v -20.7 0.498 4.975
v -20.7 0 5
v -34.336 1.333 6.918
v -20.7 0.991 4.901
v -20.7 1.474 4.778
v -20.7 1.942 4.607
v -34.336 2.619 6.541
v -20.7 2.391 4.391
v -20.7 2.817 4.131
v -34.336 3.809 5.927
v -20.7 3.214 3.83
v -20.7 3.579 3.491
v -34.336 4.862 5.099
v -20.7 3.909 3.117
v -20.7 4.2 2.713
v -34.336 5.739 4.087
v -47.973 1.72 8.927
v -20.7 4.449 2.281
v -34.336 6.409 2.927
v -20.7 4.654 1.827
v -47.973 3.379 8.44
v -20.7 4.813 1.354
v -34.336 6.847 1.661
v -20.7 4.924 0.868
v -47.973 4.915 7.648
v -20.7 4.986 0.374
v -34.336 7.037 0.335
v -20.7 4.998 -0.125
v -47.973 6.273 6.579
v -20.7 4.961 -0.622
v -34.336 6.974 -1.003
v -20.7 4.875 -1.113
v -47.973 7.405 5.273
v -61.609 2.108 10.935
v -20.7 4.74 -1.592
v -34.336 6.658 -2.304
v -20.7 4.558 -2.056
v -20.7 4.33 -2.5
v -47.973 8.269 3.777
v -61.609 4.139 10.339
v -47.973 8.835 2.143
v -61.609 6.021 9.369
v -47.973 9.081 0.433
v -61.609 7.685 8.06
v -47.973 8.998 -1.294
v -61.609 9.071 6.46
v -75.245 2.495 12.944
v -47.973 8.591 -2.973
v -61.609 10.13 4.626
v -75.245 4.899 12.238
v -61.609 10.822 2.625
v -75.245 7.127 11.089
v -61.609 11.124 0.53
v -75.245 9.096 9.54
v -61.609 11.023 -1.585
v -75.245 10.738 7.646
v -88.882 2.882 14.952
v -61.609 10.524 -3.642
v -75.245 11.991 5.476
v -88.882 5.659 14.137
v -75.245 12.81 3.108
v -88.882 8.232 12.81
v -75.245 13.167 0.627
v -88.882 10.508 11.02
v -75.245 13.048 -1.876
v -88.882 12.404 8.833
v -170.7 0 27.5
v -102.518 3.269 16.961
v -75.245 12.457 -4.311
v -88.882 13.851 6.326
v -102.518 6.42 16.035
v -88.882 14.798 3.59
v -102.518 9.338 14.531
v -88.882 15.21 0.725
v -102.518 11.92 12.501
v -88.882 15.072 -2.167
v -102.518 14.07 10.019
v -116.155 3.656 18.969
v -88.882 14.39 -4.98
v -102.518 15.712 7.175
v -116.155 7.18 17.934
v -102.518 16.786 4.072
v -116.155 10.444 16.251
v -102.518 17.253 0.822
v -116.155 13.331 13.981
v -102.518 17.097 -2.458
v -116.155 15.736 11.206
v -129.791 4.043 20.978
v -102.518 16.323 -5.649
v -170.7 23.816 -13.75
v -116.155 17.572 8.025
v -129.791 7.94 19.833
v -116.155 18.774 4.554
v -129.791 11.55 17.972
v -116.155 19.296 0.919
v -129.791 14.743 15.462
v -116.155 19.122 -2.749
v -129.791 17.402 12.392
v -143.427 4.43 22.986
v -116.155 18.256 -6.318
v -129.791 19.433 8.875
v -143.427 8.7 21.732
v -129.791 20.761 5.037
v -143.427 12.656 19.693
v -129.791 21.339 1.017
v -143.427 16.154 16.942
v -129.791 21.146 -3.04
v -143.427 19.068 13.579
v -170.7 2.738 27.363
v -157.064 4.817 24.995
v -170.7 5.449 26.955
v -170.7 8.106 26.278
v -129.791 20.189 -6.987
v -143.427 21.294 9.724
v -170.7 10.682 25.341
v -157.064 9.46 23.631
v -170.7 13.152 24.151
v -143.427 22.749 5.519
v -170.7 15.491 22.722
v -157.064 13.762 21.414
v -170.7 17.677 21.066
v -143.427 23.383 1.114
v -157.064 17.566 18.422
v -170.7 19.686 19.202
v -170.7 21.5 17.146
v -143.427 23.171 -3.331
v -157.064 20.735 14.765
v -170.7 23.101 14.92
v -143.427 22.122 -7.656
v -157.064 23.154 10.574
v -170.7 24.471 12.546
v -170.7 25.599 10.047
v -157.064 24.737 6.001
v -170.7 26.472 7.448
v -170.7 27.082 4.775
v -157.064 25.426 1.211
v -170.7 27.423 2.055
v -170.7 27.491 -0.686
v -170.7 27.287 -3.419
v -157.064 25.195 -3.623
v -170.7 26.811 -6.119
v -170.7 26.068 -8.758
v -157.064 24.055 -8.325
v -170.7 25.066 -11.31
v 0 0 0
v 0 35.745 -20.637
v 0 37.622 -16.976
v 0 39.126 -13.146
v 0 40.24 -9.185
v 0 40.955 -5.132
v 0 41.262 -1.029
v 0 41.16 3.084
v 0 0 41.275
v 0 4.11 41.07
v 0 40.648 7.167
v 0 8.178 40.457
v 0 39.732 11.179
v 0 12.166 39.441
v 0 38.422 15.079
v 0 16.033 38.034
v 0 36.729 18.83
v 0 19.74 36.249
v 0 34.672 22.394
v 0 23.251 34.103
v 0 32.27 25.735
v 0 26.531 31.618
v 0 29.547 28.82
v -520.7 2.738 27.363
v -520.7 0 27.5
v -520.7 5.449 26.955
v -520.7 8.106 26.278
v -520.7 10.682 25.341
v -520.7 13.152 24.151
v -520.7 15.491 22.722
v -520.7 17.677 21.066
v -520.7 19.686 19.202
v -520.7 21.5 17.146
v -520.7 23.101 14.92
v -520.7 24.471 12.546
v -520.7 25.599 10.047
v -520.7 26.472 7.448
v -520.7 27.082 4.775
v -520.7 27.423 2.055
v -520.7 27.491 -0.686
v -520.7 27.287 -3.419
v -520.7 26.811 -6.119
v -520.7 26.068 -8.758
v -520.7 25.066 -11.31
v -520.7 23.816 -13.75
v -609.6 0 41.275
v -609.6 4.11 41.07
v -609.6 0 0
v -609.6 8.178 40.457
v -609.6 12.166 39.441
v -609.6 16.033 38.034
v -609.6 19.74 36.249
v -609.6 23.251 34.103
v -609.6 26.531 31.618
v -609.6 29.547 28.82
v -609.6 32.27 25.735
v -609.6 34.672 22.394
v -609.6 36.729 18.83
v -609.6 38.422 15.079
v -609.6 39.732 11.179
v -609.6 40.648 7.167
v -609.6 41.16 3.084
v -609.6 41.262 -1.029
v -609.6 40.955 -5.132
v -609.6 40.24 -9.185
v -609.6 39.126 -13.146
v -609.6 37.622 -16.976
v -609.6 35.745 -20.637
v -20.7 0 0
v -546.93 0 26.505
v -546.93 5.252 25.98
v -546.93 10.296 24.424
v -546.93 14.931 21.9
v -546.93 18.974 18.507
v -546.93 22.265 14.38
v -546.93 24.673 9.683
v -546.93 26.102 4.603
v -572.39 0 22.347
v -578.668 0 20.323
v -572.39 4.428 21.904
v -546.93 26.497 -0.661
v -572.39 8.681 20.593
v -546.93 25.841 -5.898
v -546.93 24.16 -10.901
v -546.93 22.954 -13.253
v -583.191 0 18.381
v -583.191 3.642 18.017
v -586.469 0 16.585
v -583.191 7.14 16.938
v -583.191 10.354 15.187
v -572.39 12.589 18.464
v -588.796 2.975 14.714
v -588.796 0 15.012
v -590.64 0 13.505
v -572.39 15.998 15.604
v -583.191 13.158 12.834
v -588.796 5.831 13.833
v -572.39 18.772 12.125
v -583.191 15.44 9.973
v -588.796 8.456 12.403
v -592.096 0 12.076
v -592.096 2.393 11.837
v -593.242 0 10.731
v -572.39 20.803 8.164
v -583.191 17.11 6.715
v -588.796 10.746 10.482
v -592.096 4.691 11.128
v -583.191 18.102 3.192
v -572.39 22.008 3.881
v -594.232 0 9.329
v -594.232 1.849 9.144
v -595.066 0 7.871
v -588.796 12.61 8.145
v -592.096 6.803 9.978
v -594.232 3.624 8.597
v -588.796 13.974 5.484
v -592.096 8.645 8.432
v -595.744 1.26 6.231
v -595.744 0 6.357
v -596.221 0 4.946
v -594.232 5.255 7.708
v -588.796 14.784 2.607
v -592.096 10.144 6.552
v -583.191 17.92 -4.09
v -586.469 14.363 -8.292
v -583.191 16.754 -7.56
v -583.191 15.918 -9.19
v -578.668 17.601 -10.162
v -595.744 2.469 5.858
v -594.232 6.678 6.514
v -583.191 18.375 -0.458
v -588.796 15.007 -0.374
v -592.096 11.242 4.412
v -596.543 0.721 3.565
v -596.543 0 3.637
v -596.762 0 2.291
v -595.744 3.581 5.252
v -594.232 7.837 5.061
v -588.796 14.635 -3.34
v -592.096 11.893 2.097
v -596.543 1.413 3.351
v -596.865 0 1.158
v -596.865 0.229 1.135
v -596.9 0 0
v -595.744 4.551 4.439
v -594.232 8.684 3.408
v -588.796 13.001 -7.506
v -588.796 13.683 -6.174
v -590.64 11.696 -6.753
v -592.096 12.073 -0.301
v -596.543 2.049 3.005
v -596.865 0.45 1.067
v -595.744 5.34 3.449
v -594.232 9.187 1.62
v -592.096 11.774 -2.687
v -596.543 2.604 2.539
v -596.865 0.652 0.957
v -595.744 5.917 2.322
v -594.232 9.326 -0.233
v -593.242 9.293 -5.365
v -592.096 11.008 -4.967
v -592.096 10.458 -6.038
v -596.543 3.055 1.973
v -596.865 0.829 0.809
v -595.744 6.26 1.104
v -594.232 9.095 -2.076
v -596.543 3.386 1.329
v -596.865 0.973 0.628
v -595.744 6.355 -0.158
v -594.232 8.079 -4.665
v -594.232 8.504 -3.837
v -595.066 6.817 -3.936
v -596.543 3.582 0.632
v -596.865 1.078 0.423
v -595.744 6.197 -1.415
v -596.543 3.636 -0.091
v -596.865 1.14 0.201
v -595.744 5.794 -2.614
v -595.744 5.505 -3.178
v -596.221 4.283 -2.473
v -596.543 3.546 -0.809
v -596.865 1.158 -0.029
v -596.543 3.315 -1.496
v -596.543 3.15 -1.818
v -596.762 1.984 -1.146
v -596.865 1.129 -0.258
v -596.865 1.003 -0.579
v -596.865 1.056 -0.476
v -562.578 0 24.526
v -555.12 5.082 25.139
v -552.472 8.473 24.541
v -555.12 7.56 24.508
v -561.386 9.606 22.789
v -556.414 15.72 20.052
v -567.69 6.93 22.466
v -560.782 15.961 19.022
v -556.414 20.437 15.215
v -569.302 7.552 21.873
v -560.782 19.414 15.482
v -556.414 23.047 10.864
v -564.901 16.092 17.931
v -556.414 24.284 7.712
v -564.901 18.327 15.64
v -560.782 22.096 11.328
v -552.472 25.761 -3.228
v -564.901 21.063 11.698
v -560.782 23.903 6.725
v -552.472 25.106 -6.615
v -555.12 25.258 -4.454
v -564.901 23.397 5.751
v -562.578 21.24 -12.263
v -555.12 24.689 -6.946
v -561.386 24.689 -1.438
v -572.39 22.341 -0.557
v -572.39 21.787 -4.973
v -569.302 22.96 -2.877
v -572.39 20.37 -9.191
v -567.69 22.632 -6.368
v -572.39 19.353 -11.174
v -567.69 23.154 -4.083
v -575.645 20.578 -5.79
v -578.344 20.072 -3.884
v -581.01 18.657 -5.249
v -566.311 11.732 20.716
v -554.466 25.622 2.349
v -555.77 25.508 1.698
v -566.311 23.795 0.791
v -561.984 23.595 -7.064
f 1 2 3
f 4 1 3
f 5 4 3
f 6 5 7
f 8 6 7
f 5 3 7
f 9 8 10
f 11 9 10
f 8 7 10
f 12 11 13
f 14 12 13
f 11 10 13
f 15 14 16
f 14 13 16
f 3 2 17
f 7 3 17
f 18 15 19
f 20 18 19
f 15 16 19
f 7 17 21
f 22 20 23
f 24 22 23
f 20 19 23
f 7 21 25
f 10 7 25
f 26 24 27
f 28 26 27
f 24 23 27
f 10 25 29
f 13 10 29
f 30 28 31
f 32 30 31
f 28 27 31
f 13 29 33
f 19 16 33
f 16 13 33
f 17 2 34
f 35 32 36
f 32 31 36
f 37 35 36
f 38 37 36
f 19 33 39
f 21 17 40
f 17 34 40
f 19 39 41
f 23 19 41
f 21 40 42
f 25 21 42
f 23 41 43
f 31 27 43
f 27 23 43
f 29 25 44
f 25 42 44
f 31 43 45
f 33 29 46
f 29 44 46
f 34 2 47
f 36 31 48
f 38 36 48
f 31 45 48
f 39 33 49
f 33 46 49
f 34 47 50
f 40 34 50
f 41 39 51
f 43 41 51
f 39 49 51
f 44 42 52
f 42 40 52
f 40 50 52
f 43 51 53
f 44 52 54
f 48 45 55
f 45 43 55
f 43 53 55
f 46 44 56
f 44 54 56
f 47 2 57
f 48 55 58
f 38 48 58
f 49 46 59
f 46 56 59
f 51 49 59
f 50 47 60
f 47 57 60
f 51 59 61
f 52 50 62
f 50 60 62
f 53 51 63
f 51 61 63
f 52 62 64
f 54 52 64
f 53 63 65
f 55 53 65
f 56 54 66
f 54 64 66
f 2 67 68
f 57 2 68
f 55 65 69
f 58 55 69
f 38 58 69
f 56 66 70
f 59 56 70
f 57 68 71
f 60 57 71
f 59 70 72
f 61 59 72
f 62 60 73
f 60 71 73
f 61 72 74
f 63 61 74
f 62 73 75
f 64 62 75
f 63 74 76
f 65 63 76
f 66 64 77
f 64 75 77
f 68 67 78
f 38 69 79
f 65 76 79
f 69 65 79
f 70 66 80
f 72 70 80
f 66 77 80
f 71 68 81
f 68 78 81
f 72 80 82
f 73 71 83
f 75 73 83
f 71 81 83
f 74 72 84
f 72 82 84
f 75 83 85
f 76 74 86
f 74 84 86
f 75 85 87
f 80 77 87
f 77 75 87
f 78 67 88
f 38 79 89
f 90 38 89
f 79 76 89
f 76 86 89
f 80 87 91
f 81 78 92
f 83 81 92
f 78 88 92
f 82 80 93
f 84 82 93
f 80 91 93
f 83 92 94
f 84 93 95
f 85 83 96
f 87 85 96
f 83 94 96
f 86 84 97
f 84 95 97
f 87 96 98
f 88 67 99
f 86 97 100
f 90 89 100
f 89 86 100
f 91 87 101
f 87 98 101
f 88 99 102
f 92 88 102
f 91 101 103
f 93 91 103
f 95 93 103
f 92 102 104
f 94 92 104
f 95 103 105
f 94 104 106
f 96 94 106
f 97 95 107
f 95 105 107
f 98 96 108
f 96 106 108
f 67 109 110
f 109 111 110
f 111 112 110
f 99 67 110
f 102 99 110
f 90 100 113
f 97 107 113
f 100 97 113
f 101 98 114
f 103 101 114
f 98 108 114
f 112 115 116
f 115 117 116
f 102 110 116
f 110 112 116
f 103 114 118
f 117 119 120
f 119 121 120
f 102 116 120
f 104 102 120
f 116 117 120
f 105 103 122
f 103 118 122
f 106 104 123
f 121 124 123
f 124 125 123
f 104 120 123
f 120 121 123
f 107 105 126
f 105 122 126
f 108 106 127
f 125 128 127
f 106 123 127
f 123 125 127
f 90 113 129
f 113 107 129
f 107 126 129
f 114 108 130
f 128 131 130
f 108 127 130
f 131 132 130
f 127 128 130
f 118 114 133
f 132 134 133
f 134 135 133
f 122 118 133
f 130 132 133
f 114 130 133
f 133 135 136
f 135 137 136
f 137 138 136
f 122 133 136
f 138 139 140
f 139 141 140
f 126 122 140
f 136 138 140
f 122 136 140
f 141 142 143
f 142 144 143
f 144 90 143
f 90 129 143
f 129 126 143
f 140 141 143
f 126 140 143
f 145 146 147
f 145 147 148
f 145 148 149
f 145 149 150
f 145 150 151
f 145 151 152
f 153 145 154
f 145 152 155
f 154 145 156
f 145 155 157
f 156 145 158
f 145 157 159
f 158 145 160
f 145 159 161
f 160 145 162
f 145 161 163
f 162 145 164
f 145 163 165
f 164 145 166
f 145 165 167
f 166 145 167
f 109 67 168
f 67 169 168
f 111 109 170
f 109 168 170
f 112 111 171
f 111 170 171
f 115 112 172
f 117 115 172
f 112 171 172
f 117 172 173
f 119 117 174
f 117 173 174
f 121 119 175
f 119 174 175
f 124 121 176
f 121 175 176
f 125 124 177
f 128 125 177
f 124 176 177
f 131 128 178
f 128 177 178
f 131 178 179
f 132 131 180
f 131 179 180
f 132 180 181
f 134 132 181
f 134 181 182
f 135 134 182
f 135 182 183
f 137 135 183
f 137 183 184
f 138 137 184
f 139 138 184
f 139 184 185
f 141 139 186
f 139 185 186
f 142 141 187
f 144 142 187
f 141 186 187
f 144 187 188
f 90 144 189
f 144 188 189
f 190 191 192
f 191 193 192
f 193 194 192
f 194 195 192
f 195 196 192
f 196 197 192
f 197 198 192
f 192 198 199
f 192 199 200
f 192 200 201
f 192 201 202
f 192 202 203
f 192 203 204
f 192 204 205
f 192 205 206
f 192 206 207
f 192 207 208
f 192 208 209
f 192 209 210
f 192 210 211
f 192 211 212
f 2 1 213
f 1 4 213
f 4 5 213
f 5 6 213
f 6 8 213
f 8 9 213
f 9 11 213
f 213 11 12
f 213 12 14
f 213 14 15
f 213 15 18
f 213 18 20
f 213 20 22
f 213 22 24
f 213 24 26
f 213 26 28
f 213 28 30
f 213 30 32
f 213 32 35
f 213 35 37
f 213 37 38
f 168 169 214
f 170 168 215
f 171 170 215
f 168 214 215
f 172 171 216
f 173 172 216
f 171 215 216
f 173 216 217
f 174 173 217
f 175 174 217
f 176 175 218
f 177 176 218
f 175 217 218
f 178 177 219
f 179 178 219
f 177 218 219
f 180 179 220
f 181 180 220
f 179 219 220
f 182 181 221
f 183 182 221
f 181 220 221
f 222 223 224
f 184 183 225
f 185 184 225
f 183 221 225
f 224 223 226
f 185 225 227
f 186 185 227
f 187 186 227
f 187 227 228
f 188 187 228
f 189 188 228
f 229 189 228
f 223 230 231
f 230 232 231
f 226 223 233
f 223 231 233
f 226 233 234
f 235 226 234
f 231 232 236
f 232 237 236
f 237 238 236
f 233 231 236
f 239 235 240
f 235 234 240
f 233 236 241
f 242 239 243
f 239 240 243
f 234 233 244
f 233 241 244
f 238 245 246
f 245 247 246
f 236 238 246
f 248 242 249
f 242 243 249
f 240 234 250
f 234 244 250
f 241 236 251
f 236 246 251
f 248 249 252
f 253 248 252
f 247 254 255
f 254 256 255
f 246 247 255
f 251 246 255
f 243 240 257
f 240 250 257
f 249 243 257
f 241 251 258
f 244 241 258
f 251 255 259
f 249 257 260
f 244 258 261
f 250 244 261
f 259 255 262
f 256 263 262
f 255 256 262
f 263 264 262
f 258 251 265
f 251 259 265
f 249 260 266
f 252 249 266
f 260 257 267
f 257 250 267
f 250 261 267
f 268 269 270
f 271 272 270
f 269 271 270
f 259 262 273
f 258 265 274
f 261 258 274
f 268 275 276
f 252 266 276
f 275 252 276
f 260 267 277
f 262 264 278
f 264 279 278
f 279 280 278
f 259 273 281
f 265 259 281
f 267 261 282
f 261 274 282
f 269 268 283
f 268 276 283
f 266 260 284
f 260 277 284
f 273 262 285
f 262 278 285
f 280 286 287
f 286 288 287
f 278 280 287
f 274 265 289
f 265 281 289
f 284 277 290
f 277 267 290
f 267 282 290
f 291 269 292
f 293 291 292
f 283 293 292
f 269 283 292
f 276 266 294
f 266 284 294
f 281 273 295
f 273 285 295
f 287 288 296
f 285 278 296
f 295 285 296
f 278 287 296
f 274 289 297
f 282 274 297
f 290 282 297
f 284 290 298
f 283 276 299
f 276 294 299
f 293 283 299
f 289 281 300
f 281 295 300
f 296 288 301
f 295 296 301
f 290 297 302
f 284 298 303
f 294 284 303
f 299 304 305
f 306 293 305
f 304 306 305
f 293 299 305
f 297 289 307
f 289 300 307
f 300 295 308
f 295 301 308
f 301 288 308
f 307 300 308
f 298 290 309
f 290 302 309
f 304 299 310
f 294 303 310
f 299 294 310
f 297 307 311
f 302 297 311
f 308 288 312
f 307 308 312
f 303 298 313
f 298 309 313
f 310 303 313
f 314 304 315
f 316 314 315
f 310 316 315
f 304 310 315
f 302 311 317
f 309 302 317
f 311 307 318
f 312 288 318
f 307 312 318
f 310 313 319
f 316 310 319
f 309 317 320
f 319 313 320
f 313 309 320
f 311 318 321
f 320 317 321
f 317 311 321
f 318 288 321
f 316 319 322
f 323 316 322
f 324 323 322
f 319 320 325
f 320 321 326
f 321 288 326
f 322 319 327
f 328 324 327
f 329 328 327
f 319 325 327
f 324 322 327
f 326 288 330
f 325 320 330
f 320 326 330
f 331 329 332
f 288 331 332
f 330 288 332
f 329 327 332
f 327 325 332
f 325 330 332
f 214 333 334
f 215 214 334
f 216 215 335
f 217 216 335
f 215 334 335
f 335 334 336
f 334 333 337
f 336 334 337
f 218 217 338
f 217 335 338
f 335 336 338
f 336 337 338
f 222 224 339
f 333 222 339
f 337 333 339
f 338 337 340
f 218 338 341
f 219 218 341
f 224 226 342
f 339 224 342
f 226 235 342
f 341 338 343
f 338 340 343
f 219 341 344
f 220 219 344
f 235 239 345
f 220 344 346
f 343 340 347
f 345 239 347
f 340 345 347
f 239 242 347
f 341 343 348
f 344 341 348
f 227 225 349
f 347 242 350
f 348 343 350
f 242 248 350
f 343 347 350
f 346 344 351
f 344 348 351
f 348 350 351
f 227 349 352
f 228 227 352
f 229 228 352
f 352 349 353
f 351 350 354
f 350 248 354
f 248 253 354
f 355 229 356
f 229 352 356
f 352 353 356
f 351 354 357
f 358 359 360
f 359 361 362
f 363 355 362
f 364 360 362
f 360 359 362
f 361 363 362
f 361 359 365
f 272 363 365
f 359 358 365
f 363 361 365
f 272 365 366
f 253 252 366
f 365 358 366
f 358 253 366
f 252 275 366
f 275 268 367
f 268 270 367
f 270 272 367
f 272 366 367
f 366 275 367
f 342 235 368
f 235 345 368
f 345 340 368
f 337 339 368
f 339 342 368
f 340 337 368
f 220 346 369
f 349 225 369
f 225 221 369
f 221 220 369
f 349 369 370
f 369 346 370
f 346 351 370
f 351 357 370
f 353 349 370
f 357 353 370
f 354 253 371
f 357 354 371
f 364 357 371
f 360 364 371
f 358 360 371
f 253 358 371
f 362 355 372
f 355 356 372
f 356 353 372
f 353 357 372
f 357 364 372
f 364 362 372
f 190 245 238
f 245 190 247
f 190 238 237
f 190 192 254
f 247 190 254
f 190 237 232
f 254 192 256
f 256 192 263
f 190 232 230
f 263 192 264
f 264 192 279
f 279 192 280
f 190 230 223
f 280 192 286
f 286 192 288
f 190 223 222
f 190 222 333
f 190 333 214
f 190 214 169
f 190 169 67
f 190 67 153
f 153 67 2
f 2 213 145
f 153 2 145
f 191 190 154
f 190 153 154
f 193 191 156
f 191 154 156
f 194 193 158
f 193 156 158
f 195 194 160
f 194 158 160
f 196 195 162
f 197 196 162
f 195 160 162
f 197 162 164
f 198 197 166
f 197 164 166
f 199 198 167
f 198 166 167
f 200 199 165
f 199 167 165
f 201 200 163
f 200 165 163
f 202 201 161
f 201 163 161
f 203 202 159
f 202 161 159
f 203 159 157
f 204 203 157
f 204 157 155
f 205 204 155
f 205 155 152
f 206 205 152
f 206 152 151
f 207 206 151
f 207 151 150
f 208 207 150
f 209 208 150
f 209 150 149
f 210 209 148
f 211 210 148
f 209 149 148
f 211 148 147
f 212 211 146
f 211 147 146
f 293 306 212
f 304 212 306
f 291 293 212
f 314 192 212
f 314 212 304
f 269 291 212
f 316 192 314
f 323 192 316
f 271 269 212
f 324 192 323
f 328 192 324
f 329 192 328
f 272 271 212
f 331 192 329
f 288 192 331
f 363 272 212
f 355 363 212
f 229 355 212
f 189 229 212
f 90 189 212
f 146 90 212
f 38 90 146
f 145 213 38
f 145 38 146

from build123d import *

# Parameters (mm, degrees)
REVOLVE1_ANGLE = 120


with BuildPart() as part:
    # Sketch1 → Revolve1 (revolve)
    with BuildSketch(Plane(origin=(0, 0, 0), x_dir=(1, 0, 0), z_dir=(0, 1, 0))):
        Polygon((0, -41.275), (0, 0), (-20.7, 0), (-20.7, -5), (-170.7, -27.5), (-520.7, -27.5), (-596.9, -27.5), (-596.9, 0), (-609.6, 0), (-609.6, -41.275), align=None)
        with BuildLine():
            Line((-596.9, -27.5), (-520.7, -27.5))
            add(Edge.make_bspline(
                [(-520.7, -27.5), (-596.9, -27.5), (-596.9, 0)],
                knots=[0, 0, 0, 1, 1, 1], degree=2))
            Line((-596.9, 0), (-596.9, -27.5))
        make_face()
    revolve(axis=Axis((0, 0, 0), (-1, 0, 0)), revolution_arc=REVOLVE1_ANGLE)


solid = part.part
